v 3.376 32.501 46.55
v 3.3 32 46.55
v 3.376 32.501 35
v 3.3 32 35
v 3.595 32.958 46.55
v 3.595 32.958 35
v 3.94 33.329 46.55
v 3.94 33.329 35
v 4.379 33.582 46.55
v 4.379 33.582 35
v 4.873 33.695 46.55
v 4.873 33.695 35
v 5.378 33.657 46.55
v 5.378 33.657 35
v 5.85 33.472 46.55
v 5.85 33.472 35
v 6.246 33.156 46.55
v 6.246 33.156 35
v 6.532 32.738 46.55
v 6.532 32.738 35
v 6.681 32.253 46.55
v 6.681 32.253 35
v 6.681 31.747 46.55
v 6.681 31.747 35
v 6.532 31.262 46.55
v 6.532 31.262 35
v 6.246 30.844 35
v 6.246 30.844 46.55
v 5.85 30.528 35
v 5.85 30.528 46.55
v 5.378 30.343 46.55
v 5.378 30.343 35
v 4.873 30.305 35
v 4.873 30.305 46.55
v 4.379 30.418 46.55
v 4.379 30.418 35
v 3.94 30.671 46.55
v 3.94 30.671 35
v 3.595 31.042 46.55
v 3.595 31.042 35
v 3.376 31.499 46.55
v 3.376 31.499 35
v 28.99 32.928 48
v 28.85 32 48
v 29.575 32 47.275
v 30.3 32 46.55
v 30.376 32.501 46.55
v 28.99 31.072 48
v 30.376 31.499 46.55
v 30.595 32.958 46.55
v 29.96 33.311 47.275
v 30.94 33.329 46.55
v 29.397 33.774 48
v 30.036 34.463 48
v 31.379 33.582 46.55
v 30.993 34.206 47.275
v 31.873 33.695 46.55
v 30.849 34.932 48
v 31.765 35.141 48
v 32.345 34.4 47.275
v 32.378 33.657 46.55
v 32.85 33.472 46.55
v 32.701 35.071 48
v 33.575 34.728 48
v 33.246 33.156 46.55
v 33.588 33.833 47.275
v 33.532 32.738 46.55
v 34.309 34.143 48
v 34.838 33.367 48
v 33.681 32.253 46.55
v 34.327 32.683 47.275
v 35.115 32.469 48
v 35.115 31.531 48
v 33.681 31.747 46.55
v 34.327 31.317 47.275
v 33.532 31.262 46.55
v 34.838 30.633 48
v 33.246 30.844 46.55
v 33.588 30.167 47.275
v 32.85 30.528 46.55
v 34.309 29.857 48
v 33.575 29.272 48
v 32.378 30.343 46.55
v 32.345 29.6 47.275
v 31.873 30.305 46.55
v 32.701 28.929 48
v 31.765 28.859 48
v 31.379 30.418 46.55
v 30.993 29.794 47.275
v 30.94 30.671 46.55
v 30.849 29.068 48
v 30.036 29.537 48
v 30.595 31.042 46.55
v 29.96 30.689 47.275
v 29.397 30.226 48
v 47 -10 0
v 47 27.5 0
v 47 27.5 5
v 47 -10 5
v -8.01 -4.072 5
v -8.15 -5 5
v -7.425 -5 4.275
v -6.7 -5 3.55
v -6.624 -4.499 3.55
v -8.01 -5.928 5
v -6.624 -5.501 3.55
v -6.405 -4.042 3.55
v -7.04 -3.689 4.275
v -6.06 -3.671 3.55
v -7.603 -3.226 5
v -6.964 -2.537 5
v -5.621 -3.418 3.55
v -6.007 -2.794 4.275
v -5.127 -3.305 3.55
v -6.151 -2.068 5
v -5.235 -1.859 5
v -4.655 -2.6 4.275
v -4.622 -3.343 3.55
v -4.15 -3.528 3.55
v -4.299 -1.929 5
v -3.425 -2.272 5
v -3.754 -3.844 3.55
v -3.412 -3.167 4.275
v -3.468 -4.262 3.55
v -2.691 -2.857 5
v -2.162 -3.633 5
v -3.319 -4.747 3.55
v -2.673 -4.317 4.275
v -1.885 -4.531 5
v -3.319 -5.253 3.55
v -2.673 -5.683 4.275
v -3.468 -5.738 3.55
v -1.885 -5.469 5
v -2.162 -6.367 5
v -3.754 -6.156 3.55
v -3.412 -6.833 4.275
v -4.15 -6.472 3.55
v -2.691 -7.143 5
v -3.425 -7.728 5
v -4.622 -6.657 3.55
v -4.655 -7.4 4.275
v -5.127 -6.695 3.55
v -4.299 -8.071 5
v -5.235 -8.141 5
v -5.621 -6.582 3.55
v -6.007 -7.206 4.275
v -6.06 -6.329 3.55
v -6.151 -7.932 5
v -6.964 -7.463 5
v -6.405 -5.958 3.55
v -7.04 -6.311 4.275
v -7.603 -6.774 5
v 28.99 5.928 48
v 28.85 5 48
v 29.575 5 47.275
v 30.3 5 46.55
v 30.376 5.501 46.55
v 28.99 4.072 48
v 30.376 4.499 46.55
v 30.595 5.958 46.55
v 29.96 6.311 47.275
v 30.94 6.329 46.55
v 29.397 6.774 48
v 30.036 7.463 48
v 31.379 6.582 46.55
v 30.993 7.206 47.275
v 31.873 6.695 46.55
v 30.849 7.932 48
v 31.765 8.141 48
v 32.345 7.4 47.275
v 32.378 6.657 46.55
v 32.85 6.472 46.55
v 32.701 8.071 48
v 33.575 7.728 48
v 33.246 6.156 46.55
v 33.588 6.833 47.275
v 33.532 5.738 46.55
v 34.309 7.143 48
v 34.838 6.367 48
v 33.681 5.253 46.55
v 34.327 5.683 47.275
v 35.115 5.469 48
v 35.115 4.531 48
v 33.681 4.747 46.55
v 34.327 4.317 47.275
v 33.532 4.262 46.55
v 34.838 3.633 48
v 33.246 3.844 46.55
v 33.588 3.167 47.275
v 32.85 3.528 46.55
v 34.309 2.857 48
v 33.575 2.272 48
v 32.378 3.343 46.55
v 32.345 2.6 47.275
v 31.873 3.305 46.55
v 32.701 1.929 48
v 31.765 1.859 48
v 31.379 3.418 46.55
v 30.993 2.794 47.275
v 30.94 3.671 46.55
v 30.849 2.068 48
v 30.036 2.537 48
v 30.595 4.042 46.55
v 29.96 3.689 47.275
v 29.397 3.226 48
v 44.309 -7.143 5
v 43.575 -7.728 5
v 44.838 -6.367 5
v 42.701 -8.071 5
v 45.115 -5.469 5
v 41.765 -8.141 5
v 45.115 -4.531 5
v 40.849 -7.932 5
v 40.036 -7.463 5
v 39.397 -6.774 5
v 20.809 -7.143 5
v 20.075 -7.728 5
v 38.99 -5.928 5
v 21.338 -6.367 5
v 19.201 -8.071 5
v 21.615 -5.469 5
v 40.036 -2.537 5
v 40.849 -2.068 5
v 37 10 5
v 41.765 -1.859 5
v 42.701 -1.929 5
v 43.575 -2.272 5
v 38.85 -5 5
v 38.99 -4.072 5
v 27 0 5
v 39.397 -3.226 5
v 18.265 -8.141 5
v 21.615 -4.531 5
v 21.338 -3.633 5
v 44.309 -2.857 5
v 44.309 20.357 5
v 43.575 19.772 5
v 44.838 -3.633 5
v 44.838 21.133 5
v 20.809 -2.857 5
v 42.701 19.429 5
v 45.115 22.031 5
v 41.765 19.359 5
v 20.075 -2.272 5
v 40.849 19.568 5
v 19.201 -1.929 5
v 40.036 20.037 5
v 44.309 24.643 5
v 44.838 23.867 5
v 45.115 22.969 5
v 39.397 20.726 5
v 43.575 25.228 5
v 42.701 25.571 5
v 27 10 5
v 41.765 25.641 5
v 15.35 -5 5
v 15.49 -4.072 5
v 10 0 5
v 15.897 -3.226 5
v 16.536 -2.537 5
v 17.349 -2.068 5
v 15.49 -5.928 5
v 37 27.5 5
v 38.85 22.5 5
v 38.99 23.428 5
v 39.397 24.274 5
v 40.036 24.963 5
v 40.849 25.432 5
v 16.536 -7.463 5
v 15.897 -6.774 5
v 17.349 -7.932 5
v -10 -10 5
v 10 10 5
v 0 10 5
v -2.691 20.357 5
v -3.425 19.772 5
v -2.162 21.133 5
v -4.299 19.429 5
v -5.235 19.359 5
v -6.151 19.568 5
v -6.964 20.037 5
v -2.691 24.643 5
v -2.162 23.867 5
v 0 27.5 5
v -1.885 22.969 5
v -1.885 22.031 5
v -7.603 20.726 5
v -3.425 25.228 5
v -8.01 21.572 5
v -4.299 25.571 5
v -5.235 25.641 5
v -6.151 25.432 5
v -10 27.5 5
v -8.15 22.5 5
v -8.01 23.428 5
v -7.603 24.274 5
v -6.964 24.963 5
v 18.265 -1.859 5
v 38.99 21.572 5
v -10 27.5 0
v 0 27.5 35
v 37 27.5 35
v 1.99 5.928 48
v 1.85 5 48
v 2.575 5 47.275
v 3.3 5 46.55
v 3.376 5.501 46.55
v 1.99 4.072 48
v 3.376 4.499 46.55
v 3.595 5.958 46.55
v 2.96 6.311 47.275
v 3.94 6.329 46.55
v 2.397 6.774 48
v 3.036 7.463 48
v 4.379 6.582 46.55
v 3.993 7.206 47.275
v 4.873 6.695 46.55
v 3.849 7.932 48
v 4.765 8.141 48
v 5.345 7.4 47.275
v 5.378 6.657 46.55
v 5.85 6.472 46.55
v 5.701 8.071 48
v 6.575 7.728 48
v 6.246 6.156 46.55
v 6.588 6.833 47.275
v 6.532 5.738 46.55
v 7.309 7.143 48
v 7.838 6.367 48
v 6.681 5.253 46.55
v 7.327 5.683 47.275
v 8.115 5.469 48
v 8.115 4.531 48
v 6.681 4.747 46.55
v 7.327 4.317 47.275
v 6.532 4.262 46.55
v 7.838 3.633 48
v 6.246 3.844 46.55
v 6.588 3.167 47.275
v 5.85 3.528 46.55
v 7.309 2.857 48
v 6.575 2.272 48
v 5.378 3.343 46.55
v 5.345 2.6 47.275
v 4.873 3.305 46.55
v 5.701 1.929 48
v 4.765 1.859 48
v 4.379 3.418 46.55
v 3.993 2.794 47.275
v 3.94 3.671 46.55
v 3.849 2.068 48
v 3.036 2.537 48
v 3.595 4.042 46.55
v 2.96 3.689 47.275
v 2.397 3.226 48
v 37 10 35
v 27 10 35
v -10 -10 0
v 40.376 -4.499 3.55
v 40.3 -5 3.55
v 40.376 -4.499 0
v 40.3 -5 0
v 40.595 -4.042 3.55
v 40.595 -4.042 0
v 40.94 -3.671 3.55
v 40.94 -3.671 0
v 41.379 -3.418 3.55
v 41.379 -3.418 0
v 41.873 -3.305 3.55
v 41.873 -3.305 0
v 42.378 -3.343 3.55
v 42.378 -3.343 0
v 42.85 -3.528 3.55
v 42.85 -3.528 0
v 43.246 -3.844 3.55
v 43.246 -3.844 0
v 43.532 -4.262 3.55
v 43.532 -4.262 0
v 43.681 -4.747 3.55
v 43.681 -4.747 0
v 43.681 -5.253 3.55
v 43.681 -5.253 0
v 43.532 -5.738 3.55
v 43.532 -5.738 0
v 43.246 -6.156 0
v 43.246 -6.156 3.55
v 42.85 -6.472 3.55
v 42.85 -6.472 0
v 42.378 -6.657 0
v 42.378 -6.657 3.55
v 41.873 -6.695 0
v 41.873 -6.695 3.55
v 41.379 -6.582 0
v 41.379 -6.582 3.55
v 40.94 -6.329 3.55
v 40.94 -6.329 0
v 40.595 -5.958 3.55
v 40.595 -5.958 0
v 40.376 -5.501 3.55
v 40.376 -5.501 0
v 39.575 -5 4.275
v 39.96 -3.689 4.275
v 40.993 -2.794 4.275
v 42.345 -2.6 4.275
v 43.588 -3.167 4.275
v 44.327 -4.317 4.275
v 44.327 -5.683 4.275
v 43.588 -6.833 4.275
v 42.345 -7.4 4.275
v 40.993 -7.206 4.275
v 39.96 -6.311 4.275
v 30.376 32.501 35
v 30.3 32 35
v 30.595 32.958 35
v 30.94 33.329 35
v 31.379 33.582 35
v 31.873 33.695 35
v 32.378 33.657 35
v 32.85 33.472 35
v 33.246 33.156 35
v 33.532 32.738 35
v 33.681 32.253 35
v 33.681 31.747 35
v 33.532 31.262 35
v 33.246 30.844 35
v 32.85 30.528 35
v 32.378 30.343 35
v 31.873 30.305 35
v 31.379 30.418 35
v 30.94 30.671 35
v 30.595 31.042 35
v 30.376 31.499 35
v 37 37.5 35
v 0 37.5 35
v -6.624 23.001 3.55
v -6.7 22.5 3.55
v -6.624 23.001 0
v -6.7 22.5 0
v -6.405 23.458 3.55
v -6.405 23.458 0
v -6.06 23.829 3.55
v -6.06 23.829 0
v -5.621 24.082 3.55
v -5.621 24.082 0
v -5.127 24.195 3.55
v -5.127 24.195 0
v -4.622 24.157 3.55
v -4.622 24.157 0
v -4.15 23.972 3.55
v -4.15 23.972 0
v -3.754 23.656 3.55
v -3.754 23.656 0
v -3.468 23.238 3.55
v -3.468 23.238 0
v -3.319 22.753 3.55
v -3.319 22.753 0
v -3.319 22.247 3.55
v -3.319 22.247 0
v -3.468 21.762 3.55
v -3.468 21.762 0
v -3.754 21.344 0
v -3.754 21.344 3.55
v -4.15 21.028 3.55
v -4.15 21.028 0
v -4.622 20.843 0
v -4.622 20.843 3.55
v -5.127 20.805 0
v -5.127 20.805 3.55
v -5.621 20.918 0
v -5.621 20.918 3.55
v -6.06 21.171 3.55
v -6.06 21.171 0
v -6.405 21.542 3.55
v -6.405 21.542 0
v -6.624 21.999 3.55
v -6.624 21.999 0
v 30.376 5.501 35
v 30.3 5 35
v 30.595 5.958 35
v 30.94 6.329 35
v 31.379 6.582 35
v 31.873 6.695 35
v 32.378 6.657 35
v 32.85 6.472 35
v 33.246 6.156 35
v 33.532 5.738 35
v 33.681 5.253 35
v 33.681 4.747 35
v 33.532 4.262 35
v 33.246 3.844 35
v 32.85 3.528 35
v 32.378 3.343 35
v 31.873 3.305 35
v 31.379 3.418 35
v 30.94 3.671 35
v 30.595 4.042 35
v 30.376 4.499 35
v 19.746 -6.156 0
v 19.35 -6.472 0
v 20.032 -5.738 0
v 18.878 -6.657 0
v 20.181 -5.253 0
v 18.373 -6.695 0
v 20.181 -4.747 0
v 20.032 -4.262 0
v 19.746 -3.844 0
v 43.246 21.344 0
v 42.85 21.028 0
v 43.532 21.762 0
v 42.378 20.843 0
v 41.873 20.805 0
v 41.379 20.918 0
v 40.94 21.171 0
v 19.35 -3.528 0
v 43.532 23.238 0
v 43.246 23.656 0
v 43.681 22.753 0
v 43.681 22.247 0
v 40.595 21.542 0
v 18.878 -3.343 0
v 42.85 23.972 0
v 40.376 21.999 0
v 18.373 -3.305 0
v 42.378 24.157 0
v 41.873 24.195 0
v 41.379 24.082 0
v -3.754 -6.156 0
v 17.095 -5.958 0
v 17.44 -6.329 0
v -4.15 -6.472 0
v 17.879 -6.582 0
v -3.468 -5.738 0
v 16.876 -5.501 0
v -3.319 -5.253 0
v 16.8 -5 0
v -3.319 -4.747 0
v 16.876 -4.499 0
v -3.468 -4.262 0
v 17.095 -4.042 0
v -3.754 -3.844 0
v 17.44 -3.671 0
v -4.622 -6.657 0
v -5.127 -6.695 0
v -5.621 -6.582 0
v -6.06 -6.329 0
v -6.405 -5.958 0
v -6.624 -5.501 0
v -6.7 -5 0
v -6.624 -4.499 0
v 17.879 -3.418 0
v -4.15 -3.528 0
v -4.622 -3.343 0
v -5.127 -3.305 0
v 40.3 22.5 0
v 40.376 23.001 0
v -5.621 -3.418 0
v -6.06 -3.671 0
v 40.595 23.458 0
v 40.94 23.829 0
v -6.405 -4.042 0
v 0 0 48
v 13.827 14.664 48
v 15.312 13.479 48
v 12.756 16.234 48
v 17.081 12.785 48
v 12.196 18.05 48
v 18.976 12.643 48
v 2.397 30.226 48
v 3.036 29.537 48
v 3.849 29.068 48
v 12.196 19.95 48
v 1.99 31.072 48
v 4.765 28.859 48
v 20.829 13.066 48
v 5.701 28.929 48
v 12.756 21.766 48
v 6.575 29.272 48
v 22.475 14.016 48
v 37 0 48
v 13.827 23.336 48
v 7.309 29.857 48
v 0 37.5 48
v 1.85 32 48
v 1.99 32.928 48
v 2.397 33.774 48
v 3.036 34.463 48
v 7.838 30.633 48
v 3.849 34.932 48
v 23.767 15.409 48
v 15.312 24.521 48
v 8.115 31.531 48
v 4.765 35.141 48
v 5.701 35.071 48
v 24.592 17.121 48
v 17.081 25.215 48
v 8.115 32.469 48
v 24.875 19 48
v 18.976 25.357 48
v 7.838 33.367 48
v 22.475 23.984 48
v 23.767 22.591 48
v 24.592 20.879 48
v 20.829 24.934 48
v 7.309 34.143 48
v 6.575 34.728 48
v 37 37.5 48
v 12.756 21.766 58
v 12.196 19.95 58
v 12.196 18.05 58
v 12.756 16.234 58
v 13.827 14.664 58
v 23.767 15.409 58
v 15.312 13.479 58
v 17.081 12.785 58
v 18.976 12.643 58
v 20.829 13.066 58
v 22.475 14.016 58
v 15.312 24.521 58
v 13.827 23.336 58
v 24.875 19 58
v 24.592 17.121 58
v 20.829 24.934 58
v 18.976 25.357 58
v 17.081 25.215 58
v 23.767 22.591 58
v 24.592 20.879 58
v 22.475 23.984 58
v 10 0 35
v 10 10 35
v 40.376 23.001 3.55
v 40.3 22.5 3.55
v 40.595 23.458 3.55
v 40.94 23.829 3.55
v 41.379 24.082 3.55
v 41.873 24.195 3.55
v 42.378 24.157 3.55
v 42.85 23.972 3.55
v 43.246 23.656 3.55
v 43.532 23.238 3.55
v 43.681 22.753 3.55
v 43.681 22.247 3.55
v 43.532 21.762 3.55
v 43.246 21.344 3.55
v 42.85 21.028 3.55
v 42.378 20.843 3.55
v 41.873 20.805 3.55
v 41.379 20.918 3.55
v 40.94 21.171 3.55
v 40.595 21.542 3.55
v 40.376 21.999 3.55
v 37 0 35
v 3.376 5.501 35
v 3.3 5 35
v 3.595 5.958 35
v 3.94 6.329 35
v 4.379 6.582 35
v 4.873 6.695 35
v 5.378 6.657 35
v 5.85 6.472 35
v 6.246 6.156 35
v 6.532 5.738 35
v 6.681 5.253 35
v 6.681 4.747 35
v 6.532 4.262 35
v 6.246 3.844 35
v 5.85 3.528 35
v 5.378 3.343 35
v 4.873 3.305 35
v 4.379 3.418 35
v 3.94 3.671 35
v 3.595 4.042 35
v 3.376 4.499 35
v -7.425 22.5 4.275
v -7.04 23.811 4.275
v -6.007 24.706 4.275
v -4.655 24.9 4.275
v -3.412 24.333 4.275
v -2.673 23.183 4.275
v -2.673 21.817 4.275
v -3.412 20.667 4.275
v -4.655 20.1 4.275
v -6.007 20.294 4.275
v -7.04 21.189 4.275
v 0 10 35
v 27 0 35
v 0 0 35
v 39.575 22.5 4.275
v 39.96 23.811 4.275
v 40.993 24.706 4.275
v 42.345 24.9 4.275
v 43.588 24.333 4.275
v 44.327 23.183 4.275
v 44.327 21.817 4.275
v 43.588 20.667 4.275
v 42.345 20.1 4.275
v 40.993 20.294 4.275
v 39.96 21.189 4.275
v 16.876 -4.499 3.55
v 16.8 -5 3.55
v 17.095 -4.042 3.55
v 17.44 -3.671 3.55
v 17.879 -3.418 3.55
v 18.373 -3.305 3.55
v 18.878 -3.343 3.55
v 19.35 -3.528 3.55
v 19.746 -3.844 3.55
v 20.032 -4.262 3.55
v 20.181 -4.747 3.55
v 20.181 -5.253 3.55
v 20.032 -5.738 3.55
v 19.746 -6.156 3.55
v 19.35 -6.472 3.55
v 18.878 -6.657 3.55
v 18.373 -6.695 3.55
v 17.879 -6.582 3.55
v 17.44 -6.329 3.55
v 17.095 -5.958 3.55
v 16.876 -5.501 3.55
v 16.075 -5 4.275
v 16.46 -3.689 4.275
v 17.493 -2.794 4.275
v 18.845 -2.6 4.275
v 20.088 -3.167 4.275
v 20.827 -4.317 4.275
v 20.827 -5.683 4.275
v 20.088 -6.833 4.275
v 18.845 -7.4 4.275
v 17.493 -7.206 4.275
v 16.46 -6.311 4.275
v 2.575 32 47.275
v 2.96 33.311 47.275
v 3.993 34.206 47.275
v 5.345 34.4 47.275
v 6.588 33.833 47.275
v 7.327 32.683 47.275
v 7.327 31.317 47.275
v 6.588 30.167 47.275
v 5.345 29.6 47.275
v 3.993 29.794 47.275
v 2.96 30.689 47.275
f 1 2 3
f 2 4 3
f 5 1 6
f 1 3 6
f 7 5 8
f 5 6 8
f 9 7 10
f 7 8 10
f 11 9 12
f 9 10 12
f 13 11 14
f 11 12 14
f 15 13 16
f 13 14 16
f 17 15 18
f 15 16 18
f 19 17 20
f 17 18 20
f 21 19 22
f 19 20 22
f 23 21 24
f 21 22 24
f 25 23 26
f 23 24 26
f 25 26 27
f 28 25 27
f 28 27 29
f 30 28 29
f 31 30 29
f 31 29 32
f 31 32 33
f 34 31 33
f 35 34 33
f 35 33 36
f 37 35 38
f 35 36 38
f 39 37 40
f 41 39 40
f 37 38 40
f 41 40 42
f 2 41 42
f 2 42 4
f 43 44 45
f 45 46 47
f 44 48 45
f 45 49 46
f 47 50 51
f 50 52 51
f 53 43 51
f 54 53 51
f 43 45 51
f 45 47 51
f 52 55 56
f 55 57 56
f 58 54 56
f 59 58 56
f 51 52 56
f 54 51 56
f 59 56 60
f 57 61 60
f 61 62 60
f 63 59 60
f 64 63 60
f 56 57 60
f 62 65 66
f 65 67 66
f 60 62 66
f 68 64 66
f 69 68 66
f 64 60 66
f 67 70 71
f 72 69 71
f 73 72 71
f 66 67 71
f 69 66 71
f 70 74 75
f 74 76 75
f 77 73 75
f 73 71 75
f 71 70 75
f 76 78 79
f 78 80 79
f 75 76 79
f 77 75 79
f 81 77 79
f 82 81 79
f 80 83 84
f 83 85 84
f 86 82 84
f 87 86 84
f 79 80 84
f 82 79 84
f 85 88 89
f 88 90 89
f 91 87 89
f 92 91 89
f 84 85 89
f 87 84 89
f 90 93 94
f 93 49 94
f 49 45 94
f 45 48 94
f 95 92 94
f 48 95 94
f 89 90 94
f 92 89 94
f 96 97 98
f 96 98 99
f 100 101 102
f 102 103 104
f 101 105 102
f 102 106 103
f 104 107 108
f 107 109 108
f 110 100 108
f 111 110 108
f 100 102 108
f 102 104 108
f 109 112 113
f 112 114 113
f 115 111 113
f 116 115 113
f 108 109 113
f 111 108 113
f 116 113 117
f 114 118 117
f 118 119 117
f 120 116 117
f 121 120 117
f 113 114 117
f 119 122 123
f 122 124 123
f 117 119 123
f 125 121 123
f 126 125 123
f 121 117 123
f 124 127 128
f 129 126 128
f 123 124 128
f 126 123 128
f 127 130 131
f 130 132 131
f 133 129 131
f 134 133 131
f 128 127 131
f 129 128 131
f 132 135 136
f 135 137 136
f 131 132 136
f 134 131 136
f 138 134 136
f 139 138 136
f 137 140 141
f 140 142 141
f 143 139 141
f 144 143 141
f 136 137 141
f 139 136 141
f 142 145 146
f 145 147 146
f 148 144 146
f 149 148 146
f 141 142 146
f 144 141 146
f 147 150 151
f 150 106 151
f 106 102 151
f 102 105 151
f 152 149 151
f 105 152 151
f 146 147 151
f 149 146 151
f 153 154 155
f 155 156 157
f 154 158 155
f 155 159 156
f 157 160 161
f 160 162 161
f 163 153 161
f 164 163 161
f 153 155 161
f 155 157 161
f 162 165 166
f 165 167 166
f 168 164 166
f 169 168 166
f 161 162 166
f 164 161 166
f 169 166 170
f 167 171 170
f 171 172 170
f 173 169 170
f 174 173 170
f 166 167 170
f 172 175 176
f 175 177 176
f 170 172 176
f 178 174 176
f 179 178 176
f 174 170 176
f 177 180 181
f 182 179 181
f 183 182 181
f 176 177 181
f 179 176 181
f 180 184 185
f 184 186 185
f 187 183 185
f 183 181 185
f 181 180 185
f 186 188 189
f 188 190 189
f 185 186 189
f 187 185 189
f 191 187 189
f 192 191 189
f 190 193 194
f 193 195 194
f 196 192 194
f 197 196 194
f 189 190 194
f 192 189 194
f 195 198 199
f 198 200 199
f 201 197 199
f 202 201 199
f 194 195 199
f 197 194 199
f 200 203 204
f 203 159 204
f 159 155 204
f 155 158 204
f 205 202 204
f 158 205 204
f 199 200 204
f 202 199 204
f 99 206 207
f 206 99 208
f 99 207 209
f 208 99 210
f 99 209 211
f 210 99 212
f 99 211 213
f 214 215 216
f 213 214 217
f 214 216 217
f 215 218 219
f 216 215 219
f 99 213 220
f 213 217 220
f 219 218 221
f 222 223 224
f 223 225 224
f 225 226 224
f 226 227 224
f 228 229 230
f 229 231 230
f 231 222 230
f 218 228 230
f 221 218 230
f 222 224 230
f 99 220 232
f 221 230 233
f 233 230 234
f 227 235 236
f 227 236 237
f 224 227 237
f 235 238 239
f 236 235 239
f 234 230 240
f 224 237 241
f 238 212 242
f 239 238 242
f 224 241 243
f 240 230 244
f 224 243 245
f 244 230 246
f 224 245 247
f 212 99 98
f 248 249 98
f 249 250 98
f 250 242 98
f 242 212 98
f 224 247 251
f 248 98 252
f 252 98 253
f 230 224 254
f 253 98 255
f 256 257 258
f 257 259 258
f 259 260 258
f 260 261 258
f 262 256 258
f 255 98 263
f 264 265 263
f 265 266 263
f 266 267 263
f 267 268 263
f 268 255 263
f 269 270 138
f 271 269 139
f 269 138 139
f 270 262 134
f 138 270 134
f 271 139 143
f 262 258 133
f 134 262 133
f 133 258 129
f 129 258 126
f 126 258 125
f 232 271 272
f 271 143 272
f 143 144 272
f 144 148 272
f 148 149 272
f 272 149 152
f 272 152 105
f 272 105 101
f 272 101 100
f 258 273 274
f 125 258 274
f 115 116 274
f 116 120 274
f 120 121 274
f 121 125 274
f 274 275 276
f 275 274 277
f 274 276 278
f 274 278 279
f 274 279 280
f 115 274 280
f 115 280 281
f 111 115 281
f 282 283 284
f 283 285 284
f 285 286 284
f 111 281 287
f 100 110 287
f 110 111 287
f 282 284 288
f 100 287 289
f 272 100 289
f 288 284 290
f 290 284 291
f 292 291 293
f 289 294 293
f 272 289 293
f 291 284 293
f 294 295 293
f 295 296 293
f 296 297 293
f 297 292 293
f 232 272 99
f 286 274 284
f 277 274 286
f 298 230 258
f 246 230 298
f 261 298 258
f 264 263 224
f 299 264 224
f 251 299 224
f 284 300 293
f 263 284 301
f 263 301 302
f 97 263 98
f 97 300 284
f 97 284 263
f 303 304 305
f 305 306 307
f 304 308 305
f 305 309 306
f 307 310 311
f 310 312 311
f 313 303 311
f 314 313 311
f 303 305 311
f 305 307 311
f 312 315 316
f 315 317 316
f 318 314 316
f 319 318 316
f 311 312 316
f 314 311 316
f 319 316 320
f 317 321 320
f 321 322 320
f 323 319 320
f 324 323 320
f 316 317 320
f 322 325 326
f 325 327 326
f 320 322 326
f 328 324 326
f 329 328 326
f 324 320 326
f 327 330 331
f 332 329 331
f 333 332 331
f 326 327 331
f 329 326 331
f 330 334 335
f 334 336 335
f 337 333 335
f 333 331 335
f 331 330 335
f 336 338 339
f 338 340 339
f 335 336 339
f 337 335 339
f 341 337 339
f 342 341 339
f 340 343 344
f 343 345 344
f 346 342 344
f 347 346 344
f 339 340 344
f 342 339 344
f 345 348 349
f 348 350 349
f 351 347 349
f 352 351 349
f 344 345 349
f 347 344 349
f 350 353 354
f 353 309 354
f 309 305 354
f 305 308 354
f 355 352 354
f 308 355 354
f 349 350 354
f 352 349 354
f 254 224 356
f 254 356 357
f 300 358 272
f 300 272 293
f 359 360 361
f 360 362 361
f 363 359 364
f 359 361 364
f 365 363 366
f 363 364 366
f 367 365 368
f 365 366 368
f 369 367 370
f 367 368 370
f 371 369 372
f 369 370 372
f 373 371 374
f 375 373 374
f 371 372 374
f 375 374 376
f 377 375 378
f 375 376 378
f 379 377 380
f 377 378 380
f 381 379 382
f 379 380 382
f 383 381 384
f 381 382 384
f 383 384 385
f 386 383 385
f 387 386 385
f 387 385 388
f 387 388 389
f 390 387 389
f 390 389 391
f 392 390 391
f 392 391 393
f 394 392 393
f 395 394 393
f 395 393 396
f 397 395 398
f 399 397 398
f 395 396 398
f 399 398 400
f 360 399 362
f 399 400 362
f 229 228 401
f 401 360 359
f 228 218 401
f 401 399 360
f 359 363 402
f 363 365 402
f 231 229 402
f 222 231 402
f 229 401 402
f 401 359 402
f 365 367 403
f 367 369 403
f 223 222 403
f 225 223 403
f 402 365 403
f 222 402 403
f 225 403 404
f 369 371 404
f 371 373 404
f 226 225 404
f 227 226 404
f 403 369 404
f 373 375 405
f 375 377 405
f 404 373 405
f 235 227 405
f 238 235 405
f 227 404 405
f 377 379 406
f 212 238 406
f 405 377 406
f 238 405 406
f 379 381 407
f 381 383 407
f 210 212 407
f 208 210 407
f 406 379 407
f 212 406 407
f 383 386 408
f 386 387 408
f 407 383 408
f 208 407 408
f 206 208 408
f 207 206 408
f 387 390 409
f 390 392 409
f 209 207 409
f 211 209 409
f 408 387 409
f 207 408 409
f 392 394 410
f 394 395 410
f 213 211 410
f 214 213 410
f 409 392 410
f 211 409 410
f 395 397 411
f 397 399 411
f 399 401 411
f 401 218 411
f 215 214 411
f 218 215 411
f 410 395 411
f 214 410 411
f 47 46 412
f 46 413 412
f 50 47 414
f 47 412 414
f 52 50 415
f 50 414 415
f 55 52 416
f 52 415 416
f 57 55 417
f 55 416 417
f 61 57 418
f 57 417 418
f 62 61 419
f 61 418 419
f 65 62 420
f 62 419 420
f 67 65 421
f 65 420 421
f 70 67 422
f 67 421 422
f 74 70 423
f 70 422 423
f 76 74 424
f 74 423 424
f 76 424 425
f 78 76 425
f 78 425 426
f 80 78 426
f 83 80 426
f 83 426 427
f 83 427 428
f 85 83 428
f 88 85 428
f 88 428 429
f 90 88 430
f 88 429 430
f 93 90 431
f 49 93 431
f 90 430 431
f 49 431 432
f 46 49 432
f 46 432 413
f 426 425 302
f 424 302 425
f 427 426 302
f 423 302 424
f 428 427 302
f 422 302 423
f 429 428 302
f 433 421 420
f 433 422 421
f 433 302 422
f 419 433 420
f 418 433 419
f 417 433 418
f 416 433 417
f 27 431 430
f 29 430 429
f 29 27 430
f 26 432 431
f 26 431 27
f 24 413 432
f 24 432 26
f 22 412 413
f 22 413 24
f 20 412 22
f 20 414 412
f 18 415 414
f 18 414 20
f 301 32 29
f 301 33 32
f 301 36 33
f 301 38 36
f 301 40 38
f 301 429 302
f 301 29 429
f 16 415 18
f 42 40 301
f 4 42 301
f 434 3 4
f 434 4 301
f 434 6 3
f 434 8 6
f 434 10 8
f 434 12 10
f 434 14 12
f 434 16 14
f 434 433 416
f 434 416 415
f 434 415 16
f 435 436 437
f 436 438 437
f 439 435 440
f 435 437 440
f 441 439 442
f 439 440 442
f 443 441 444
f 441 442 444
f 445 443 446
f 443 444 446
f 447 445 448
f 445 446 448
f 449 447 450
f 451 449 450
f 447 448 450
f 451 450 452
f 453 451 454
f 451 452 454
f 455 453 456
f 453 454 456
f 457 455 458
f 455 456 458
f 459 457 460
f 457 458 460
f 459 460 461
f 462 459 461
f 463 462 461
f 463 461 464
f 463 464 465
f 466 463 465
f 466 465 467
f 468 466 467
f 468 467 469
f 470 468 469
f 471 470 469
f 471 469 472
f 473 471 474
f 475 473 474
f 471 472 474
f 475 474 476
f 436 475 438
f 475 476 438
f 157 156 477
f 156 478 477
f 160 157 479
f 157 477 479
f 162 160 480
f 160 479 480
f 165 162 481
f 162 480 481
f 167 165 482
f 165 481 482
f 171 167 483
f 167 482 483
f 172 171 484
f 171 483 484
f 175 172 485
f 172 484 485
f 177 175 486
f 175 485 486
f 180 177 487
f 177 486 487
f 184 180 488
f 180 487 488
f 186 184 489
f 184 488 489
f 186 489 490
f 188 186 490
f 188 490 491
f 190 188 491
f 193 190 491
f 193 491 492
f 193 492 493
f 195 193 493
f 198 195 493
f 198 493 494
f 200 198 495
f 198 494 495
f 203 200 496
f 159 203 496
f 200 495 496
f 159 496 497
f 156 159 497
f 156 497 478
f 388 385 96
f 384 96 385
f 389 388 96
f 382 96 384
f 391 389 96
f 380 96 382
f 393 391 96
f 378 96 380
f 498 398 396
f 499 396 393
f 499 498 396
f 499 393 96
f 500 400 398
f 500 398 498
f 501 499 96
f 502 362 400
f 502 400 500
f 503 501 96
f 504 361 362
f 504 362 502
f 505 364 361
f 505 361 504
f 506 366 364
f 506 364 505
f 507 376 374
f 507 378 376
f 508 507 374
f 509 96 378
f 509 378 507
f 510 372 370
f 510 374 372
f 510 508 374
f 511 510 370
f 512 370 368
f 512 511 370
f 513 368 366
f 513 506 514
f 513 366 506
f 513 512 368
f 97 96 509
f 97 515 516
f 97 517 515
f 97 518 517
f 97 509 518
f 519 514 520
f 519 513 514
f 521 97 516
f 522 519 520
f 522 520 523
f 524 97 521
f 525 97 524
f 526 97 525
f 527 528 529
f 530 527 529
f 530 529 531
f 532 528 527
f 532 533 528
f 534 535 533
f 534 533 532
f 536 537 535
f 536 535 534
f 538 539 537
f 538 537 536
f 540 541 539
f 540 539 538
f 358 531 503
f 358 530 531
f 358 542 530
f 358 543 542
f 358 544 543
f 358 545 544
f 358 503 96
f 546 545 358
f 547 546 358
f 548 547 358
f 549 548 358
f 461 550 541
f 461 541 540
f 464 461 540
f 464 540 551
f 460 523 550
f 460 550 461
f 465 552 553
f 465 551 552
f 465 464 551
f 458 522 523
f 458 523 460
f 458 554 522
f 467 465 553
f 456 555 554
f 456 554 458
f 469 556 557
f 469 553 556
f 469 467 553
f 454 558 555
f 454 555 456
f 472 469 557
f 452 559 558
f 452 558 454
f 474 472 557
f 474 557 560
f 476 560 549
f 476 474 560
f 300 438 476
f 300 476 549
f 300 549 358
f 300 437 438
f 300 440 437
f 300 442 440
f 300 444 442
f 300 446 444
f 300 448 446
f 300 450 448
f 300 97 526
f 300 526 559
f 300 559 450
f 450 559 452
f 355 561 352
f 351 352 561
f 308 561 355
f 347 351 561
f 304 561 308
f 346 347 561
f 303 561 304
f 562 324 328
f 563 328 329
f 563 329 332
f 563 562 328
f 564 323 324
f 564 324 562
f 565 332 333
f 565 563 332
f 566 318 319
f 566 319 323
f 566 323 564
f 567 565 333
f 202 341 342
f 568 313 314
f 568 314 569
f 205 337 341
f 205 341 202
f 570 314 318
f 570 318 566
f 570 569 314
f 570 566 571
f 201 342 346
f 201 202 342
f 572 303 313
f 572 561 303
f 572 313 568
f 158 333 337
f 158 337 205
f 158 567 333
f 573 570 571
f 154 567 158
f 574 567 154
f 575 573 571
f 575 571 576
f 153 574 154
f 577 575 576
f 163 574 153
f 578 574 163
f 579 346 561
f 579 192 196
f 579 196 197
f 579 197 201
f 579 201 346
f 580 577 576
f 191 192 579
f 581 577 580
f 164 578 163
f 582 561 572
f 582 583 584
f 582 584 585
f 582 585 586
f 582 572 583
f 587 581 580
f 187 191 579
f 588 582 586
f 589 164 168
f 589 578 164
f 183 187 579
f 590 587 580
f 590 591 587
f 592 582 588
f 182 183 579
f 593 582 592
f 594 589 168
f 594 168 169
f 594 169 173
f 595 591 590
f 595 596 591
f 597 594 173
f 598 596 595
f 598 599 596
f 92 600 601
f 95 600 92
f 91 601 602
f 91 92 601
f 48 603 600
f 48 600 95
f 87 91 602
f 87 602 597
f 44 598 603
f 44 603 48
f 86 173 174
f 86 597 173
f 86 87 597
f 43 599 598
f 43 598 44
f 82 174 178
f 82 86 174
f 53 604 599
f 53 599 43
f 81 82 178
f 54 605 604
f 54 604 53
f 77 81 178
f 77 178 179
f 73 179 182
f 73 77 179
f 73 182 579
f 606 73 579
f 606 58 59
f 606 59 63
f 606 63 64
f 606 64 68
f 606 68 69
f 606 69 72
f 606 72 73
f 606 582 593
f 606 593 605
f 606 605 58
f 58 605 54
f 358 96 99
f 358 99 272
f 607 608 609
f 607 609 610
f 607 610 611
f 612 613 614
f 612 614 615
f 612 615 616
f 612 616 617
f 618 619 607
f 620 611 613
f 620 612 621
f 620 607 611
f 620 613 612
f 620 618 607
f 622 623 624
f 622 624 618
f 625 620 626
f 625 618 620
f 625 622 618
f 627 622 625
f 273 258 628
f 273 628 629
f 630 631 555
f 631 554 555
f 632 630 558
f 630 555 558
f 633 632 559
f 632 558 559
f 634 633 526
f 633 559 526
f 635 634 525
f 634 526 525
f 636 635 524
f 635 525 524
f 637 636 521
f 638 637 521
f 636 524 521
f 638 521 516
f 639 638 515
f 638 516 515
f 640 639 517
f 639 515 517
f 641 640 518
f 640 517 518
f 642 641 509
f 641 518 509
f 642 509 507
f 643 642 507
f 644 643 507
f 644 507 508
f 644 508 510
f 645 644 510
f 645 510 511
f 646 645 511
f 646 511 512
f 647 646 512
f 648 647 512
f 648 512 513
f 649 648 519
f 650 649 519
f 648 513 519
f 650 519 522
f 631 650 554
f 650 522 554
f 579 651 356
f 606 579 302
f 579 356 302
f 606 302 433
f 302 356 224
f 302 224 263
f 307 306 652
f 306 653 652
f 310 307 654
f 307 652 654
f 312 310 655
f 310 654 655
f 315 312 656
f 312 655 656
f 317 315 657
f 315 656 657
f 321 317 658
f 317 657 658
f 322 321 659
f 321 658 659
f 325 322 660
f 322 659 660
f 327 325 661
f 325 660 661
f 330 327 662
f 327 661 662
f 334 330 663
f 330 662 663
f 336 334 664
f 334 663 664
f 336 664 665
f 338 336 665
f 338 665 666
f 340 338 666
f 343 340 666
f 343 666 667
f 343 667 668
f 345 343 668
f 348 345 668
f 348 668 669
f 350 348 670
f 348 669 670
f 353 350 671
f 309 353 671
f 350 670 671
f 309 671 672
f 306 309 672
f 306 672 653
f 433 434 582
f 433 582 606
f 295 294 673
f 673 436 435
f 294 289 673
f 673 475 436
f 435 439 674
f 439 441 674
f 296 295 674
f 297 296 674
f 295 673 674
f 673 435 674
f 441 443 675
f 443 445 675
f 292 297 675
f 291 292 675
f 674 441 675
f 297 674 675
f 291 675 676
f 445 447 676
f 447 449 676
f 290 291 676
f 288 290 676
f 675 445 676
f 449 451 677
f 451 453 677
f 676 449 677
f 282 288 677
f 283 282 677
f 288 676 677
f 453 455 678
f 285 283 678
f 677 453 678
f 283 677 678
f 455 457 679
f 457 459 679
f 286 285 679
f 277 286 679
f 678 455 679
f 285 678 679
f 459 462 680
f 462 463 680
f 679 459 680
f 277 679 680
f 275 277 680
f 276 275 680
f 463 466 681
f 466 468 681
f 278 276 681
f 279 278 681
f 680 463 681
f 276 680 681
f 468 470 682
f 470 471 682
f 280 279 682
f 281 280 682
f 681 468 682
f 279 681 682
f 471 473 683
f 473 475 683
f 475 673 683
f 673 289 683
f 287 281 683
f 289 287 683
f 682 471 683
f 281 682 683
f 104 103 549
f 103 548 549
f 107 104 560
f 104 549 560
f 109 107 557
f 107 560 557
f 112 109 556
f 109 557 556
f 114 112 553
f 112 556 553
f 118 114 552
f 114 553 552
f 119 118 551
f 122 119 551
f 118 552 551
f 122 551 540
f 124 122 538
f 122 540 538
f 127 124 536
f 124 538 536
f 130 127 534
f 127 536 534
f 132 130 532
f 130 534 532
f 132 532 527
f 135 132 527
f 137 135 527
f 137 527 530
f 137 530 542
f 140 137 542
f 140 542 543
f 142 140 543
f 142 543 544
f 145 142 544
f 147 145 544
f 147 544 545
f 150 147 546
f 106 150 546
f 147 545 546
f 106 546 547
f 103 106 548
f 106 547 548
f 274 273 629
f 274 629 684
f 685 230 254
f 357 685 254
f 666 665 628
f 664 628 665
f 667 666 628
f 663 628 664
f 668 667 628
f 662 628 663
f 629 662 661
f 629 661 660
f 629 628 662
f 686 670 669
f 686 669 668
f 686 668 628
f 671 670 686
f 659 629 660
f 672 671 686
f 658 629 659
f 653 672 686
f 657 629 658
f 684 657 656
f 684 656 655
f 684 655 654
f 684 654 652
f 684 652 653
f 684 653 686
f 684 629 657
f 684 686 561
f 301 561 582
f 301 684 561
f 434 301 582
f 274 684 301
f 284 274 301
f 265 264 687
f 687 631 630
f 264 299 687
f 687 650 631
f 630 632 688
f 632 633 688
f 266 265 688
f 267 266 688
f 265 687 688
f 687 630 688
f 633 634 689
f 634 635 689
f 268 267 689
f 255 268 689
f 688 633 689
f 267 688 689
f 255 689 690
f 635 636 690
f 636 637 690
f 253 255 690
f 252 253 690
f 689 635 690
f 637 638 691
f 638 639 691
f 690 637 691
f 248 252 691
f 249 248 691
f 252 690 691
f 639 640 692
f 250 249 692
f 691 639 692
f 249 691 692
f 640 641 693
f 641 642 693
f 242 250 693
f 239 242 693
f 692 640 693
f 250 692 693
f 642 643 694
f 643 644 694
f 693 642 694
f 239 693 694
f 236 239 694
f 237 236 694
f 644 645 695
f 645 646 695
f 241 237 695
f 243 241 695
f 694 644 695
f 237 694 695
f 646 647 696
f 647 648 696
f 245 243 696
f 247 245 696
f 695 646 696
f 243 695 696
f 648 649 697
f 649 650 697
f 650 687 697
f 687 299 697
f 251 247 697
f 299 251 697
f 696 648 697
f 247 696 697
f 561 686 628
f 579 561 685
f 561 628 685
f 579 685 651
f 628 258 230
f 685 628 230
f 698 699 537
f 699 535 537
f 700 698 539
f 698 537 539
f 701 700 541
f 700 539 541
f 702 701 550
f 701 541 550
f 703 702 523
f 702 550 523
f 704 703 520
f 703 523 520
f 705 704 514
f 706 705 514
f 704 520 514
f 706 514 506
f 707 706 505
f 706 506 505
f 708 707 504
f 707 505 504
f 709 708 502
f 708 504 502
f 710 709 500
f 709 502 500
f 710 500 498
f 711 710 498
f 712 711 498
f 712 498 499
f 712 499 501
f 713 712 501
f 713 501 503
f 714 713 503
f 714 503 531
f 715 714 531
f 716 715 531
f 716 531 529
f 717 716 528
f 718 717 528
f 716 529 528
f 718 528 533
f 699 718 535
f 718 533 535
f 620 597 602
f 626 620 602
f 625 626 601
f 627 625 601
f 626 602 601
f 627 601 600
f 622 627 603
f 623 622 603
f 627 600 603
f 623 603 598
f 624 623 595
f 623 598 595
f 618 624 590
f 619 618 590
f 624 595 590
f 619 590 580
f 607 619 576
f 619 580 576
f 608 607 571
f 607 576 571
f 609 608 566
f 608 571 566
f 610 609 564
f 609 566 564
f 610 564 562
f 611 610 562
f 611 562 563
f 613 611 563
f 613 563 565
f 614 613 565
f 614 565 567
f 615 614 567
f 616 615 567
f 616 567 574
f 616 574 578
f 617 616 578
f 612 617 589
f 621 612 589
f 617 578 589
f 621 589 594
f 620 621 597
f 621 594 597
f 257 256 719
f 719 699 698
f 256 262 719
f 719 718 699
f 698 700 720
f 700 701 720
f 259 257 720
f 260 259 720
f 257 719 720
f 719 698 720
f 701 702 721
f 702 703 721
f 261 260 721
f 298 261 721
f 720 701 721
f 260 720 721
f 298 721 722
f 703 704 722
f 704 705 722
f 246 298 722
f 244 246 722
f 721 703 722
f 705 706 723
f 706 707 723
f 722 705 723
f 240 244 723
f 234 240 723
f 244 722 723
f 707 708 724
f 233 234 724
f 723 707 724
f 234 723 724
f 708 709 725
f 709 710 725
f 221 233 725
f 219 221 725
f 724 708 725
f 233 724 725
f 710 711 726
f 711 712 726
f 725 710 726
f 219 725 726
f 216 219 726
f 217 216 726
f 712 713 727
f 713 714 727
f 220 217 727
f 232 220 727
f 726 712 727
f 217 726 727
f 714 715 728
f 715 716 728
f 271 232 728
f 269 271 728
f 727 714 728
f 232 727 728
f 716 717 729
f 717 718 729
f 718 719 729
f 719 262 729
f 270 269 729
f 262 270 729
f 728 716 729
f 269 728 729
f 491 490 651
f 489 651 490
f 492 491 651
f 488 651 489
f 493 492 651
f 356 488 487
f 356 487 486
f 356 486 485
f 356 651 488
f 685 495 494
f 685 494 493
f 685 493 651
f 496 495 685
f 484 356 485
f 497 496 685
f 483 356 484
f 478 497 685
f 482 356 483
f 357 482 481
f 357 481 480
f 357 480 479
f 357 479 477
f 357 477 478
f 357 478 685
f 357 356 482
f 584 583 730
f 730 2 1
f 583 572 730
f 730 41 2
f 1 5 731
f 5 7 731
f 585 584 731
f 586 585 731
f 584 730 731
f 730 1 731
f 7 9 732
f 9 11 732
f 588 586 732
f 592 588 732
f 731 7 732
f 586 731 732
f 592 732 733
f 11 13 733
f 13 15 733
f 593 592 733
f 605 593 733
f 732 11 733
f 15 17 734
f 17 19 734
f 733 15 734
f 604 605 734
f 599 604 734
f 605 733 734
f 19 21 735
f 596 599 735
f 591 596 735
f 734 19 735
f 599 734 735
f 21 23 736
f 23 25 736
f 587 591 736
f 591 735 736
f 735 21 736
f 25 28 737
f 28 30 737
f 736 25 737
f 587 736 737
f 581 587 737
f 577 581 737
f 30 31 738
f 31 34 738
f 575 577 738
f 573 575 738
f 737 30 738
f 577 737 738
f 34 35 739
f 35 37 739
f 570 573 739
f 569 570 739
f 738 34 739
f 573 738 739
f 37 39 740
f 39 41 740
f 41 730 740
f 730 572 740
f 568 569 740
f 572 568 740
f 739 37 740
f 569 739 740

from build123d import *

# Parameters (mm, degrees)
ESQUISSE1_W                                       = 37
ESQUISSE1_H                                       = 37.5
BOSS_EXTRU_1_DEPTH                                = 48
ESQUISSE2_R                                       = 6.375
BOSS_EXTRU_2_DEPTH                                = 10
ENL_V_START                                       = -5
ESQUISSE10_W                                      = 10
ESQUISSE10_H                                      = 10
ESQUISSE10_W_2                                    = 37
ENL_V_MAT_EXTRU_1_DEPTH                           = 30
FRAISAGE_POUR_VIS_T_TE_FRAIS_E_BOMB_E_D           = 3.4
FRAISAGE_POUR_VIS_T_TE_FRAIS_E_BOMB_E_DEPTH       = 13
FRAISAGE_POUR_VIS_T_TE_FRAIS_E_BOMB_E_CSINK_D     = 6.3
FRAISAGE_POUR_VIS_T_TE_FRAIS_E_BOMB_E_CSINK_ANGLE = 90
FRAISAGE_POUR_VIS_T_TE_FRAIS_E_BOMB_E_TIP         = 1.021463052
BOSS_EXTRU_5_DEPTH                                = 5
ESQUISSE12_W                                      = 37
ESQUISSE12_H                                      = 10
ENL_V_MAT_EXTRU_2_DEPTH                           = 5
FRAISAGE_POUR_VIS_T_TE_FRAIS_E_BOM_2_D            = 3.4
FRAISAGE_POUR_VIS_T_TE_FRAIS_E_BOM_2_DEPTH        = 5
FRAISAGE_POUR_VIS_T_TE_FRAIS_E_BOM_2_CSINK_D      = 6.3
FRAISAGE_POUR_VIS_T_TE_FRAIS_E_BOM_2_CSINK_ANGLE  = 90
FRAISAGE_POUR_VIS_T_TE_FRAIS_E_BOM_2_TIP          = 1.021463052


with BuildPart() as part:
    # Esquisse1 → Boss.-Extru.1 (new body)
    with BuildSketch(Plane.XY):
        with Locations((18.5, 18.75)):
            Rectangle(ESQUISSE1_W, ESQUISSE1_H)
    extrude(amount=BOSS_EXTRU_1_DEPTH)

    # Esquisse2 → Boss.-Extru.2 (add)
    with BuildSketch(Plane.XY.offset(48)):
        with Locations((18.5, 19)):
            Circle(ESQUISSE2_R)
    extrude(amount=BOSS_EXTRU_2_DEPTH)

    # Esquisse10 → Enlèv. mat.-Extru.1 (cut)
    with BuildSketch(Plane(origin=(0, 0, 0), x_dir=(-1, 0, 0), z_dir=(0, 0, -1)).offset(ENL_V_START)):
        with Locations((-32, 5)):
            Rectangle(ESQUISSE10_W, ESQUISSE10_H)
        with Locations((-18.5, 32.5)):
            Rectangle(ESQUISSE10_W_2, ESQUISSE10_H)
        with Locations((-5, 5)):
            Rectangle(ESQUISSE10_W, ESQUISSE10_H)
    extrude(amount=-ENL_V_MAT_EXTRU_1_DEPTH, mode=Mode.SUBTRACT)

    # Fraisage pour vis _ t_te frais_e bomb_e
    with Locations(Plane.XY.offset(48)):
        with Locations((5, 32), (32, 32), (32, 5), (5, 5)):
            CounterSinkHole(FRAISAGE_POUR_VIS_T_TE_FRAIS_E_BOMB_E_D / 2, FRAISAGE_POUR_VIS_T_TE_FRAIS_E_BOMB_E_CSINK_D / 2, depth=FRAISAGE_POUR_VIS_T_TE_FRAIS_E_BOMB_E_DEPTH, counter_sink_angle=FRAISAGE_POUR_VIS_T_TE_FRAIS_E_BOMB_E_CSINK_ANGLE)
            with Locations((0, 0, -(FRAISAGE_POUR_VIS_T_TE_FRAIS_E_BOMB_E_DEPTH + FRAISAGE_POUR_VIS_T_TE_FRAIS_E_BOMB_E_TIP / 2))):  # 118° drill point
                Cone(0, FRAISAGE_POUR_VIS_T_TE_FRAIS_E_BOMB_E_D / 2, FRAISAGE_POUR_VIS_T_TE_FRAIS_E_BOMB_E_TIP, mode=Mode.SUBTRACT)

    # Esquisse11 → Boss.-Extru.5 (add)
    with BuildSketch(Plane(origin=(0, 0, 0), x_dir=(-1, 0, 0), z_dir=(0, 0, -1))):
        Polygon((-37, 27.5), (-47, 27.5), (-47, -10), (10, -10), (10, 27.5), (0, 27.5), (0, 0), (-37, 0), align=None)
    extrude(amount=-BOSS_EXTRU_5_DEPTH)

    # Esquisse12 → Enlèv. mat.-Extru.2 (cut)
    with BuildSketch(Plane(origin=(0, 0, 0), x_dir=(-1, 0, 0), z_dir=(0, 0, -1))):
        with Locations((-18.5, 32.5)):
            Rectangle(ESQUISSE12_W, ESQUISSE12_H)
    extrude(amount=-ENL_V_MAT_EXTRU_2_DEPTH, mode=Mode.SUBTRACT)

    # Fraisage pour vis _ t_te frais_e bom 2
    with Locations(Plane.XY.offset(5)):
        with Locations((-5, 22.5), (-5, -5), (18.5, -5), (42, -5), (42, 22.5)):
            CounterSinkHole(FRAISAGE_POUR_VIS_T_TE_FRAIS_E_BOM_2_D / 2, FRAISAGE_POUR_VIS_T_TE_FRAIS_E_BOM_2_CSINK_D / 2, depth=FRAISAGE_POUR_VIS_T_TE_FRAIS_E_BOM_2_DEPTH, counter_sink_angle=FRAISAGE_POUR_VIS_T_TE_FRAIS_E_BOM_2_CSINK_ANGLE)
            with Locations((0, 0, -(FRAISAGE_POUR_VIS_T_TE_FRAIS_E_BOM_2_DEPTH + FRAISAGE_POUR_VIS_T_TE_FRAIS_E_BOM_2_TIP / 2))):  # 118° drill point
                Cone(0, FRAISAGE_POUR_VIS_T_TE_FRAIS_E_BOM_2_D / 2, FRAISAGE_POUR_VIS_T_TE_FRAIS_E_BOM_2_TIP, mode=Mode.SUBTRACT)


solid = part.part
